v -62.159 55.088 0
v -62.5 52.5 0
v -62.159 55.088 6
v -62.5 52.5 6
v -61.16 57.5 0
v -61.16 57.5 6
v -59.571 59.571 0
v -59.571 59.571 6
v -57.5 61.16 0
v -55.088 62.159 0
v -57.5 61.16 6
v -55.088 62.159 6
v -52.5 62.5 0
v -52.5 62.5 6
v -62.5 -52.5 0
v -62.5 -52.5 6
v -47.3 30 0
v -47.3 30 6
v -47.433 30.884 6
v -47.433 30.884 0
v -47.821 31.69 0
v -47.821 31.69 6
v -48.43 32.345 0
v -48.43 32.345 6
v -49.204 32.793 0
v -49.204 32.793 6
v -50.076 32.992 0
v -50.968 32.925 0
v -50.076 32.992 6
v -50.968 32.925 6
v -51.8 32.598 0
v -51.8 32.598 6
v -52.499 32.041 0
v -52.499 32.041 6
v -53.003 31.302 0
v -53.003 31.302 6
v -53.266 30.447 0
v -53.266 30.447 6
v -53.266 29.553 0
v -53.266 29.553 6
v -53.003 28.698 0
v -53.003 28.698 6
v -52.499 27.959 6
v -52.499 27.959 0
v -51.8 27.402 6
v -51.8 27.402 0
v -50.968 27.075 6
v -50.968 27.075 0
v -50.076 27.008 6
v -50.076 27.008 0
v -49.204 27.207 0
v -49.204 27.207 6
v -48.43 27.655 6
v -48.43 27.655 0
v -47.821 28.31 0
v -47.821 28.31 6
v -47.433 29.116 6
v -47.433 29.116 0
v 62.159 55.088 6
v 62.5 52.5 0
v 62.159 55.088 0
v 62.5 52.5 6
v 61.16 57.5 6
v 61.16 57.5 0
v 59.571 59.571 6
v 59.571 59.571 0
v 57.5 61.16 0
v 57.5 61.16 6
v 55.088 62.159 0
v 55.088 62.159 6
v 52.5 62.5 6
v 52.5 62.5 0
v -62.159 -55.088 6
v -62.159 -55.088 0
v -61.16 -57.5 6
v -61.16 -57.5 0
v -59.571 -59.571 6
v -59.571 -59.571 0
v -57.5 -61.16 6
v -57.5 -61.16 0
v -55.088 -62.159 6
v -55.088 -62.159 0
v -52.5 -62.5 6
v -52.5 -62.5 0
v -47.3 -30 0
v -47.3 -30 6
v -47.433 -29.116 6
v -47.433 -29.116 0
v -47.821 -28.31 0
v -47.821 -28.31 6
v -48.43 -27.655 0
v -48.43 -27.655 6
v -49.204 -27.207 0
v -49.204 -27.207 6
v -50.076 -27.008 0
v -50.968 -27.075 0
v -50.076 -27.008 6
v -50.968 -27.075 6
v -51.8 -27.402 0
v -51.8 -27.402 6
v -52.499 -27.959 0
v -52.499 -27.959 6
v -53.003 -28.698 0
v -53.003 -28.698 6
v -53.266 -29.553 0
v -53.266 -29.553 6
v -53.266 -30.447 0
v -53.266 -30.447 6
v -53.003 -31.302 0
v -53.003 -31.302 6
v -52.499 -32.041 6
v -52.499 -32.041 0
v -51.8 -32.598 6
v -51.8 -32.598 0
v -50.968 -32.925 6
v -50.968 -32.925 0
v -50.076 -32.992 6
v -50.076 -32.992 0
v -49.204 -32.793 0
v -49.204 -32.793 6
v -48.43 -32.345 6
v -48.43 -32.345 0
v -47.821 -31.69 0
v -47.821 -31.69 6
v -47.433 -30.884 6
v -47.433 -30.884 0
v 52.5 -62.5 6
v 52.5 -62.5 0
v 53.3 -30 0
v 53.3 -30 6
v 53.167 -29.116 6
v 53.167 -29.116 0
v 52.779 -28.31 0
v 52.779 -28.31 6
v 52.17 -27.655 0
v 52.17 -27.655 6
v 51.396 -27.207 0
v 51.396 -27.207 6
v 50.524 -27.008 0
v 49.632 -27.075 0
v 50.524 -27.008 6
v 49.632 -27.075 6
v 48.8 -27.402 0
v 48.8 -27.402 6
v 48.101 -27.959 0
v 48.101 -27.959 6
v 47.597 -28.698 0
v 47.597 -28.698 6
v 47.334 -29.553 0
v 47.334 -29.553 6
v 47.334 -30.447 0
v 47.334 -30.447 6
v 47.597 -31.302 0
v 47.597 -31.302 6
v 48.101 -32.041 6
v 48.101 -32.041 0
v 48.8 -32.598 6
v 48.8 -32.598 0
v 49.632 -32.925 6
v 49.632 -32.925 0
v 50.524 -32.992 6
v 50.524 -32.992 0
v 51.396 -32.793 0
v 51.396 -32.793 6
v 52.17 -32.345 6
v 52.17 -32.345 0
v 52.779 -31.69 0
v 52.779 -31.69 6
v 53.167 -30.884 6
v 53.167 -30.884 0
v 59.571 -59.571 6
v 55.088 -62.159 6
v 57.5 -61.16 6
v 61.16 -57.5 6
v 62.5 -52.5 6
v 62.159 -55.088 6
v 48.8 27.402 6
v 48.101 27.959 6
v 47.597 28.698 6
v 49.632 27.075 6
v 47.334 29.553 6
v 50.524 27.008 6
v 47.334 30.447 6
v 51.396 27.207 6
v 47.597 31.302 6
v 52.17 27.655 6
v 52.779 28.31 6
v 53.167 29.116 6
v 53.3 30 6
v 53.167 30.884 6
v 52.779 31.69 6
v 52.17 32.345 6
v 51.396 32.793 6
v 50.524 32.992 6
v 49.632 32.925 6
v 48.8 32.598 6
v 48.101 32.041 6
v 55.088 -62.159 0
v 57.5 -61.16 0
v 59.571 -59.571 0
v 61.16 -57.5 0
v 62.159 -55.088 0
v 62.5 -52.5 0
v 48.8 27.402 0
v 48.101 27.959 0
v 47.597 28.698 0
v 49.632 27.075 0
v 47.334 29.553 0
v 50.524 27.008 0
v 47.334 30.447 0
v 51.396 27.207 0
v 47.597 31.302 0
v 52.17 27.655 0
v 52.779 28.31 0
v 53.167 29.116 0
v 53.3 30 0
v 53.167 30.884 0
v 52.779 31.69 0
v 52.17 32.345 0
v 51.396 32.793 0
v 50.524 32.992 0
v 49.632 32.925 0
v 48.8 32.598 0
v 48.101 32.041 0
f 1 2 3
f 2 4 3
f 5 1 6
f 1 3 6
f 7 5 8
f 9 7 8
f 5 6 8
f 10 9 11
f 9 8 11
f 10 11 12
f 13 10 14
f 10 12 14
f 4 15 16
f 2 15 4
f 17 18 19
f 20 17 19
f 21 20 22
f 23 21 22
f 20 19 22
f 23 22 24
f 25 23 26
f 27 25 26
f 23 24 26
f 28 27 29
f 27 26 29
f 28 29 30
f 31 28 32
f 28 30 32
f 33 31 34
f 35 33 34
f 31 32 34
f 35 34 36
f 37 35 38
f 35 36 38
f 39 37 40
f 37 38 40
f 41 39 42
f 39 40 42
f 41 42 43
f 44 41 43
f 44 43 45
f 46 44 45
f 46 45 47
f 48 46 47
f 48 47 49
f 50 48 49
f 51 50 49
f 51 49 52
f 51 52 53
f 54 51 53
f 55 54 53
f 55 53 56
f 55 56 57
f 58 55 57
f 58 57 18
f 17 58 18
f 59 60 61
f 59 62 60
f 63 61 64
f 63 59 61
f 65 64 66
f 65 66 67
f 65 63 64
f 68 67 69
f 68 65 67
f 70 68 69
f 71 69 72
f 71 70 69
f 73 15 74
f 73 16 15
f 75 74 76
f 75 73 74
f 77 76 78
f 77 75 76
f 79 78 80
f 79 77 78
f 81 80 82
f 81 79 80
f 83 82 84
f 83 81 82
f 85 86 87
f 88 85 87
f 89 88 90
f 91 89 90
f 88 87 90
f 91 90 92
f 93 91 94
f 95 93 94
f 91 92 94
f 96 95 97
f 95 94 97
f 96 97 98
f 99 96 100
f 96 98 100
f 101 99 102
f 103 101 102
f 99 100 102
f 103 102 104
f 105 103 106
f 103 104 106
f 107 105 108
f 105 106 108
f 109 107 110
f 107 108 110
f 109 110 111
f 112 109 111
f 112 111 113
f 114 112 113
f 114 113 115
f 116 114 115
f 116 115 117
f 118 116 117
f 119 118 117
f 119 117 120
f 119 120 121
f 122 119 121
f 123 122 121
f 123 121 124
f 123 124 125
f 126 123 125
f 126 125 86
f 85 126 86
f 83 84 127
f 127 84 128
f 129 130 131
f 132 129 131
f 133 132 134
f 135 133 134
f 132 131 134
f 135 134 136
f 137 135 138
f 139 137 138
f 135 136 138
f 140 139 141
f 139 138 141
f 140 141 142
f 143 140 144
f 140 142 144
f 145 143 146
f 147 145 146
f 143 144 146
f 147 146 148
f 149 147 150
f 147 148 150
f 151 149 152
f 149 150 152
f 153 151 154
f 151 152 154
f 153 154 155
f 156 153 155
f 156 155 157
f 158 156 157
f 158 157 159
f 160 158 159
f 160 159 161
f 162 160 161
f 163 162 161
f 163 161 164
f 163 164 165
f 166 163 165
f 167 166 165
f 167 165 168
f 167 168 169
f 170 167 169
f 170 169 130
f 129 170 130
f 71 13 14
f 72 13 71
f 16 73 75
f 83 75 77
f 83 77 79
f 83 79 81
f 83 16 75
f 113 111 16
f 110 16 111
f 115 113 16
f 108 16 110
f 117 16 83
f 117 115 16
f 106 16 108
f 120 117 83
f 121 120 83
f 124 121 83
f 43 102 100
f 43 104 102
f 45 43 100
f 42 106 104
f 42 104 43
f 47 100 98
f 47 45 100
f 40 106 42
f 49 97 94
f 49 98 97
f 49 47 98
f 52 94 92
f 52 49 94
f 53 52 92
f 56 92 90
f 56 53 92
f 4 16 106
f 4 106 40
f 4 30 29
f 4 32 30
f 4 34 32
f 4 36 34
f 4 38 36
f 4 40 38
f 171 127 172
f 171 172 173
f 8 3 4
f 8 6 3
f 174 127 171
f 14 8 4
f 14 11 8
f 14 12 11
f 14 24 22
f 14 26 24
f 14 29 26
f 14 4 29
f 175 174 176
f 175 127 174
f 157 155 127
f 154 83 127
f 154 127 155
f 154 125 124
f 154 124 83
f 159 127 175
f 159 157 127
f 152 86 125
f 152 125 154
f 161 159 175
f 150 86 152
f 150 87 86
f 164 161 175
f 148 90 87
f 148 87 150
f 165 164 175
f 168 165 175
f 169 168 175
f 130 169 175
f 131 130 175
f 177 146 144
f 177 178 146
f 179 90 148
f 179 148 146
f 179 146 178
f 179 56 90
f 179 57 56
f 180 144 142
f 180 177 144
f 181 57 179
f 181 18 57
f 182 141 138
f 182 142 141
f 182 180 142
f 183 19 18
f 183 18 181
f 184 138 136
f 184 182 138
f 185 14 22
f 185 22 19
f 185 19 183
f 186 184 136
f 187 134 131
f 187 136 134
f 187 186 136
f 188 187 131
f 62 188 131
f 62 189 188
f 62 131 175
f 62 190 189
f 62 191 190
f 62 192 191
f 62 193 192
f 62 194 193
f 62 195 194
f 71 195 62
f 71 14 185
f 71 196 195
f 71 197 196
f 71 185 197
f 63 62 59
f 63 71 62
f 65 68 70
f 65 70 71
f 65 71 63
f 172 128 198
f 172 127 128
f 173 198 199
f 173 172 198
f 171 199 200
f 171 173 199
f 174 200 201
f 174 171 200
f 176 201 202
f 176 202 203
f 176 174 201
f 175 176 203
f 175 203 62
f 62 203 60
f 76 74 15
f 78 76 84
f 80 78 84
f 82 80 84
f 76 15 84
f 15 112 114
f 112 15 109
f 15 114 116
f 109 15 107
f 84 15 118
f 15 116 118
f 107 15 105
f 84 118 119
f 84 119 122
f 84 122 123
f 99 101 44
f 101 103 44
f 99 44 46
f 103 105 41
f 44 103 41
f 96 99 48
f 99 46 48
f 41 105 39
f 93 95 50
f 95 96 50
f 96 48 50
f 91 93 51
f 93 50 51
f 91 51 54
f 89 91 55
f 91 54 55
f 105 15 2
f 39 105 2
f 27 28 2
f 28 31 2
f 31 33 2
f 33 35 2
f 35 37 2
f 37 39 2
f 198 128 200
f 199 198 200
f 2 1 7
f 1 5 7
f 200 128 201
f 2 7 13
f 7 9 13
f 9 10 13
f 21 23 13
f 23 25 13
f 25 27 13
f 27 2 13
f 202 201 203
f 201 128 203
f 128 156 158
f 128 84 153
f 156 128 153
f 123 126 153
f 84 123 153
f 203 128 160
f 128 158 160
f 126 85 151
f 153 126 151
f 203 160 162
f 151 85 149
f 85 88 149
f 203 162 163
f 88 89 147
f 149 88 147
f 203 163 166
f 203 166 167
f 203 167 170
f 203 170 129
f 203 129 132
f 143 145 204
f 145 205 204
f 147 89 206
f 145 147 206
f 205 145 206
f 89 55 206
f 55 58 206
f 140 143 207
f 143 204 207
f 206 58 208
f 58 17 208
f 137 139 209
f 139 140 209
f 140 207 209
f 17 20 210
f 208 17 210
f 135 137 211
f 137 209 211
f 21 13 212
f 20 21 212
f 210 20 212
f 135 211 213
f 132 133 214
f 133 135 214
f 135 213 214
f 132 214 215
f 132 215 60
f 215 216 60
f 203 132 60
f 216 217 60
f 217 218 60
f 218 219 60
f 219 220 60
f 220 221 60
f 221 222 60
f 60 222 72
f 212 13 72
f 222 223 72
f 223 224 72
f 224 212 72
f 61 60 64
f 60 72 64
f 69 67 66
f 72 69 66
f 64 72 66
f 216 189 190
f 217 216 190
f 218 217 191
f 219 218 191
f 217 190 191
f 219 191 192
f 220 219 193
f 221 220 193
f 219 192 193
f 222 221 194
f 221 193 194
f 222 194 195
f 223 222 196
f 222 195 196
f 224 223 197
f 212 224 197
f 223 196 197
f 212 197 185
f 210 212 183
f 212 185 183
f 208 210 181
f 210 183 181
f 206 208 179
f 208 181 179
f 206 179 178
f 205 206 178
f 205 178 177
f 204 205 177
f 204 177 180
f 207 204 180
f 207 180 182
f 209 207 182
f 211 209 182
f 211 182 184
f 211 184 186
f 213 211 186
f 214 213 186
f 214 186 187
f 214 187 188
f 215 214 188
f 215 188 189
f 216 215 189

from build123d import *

# Parameters (mm, degrees)
SKETCH1_W           = 125
SKETCH1_H           = 125
BOSS_EXTRUDE1_DEPTH = 6
FILLET1_R           = 10
SKETCH9_R           = 3
CUT_EXTRUDE1_DEPTH  = 10


with BuildPart() as part:
    # Sketch1 → Boss-Extrude1 (new body)
    with BuildSketch(Plane.XY):
        Rectangle(SKETCH1_W, SKETCH1_H)
    extrude(amount=BOSS_EXTRUDE1_DEPTH)

    # Fillet1
    fillet1_edges = [part.edges().sort_by_distance(p)[0] for p in [
        (-62.5, 62.5, 3),
        (62.5, 62.5, 3),
        (62.5, -62.5, 3),
        (-62.5, -62.5, 3),
    ]]
    fillet(fillet1_edges, radius=FILLET1_R)

    # Sketch9 → Cut-Extrude1 (cut)
    with BuildSketch(Plane.XY.offset(6)):
        with Locations((50.3, 30)):
            Circle(SKETCH9_R)
        with Locations((50.3, -30)):
            Circle(SKETCH9_R)
        with Locations((-50.3, 30)):
            Circle(SKETCH9_R)
        with Locations((-50.3, -30)):
            Circle(SKETCH9_R)
    extrude(amount=-CUT_EXTRUDE1_DEPTH, mode=Mode.SUBTRACT)


solid = part.part
